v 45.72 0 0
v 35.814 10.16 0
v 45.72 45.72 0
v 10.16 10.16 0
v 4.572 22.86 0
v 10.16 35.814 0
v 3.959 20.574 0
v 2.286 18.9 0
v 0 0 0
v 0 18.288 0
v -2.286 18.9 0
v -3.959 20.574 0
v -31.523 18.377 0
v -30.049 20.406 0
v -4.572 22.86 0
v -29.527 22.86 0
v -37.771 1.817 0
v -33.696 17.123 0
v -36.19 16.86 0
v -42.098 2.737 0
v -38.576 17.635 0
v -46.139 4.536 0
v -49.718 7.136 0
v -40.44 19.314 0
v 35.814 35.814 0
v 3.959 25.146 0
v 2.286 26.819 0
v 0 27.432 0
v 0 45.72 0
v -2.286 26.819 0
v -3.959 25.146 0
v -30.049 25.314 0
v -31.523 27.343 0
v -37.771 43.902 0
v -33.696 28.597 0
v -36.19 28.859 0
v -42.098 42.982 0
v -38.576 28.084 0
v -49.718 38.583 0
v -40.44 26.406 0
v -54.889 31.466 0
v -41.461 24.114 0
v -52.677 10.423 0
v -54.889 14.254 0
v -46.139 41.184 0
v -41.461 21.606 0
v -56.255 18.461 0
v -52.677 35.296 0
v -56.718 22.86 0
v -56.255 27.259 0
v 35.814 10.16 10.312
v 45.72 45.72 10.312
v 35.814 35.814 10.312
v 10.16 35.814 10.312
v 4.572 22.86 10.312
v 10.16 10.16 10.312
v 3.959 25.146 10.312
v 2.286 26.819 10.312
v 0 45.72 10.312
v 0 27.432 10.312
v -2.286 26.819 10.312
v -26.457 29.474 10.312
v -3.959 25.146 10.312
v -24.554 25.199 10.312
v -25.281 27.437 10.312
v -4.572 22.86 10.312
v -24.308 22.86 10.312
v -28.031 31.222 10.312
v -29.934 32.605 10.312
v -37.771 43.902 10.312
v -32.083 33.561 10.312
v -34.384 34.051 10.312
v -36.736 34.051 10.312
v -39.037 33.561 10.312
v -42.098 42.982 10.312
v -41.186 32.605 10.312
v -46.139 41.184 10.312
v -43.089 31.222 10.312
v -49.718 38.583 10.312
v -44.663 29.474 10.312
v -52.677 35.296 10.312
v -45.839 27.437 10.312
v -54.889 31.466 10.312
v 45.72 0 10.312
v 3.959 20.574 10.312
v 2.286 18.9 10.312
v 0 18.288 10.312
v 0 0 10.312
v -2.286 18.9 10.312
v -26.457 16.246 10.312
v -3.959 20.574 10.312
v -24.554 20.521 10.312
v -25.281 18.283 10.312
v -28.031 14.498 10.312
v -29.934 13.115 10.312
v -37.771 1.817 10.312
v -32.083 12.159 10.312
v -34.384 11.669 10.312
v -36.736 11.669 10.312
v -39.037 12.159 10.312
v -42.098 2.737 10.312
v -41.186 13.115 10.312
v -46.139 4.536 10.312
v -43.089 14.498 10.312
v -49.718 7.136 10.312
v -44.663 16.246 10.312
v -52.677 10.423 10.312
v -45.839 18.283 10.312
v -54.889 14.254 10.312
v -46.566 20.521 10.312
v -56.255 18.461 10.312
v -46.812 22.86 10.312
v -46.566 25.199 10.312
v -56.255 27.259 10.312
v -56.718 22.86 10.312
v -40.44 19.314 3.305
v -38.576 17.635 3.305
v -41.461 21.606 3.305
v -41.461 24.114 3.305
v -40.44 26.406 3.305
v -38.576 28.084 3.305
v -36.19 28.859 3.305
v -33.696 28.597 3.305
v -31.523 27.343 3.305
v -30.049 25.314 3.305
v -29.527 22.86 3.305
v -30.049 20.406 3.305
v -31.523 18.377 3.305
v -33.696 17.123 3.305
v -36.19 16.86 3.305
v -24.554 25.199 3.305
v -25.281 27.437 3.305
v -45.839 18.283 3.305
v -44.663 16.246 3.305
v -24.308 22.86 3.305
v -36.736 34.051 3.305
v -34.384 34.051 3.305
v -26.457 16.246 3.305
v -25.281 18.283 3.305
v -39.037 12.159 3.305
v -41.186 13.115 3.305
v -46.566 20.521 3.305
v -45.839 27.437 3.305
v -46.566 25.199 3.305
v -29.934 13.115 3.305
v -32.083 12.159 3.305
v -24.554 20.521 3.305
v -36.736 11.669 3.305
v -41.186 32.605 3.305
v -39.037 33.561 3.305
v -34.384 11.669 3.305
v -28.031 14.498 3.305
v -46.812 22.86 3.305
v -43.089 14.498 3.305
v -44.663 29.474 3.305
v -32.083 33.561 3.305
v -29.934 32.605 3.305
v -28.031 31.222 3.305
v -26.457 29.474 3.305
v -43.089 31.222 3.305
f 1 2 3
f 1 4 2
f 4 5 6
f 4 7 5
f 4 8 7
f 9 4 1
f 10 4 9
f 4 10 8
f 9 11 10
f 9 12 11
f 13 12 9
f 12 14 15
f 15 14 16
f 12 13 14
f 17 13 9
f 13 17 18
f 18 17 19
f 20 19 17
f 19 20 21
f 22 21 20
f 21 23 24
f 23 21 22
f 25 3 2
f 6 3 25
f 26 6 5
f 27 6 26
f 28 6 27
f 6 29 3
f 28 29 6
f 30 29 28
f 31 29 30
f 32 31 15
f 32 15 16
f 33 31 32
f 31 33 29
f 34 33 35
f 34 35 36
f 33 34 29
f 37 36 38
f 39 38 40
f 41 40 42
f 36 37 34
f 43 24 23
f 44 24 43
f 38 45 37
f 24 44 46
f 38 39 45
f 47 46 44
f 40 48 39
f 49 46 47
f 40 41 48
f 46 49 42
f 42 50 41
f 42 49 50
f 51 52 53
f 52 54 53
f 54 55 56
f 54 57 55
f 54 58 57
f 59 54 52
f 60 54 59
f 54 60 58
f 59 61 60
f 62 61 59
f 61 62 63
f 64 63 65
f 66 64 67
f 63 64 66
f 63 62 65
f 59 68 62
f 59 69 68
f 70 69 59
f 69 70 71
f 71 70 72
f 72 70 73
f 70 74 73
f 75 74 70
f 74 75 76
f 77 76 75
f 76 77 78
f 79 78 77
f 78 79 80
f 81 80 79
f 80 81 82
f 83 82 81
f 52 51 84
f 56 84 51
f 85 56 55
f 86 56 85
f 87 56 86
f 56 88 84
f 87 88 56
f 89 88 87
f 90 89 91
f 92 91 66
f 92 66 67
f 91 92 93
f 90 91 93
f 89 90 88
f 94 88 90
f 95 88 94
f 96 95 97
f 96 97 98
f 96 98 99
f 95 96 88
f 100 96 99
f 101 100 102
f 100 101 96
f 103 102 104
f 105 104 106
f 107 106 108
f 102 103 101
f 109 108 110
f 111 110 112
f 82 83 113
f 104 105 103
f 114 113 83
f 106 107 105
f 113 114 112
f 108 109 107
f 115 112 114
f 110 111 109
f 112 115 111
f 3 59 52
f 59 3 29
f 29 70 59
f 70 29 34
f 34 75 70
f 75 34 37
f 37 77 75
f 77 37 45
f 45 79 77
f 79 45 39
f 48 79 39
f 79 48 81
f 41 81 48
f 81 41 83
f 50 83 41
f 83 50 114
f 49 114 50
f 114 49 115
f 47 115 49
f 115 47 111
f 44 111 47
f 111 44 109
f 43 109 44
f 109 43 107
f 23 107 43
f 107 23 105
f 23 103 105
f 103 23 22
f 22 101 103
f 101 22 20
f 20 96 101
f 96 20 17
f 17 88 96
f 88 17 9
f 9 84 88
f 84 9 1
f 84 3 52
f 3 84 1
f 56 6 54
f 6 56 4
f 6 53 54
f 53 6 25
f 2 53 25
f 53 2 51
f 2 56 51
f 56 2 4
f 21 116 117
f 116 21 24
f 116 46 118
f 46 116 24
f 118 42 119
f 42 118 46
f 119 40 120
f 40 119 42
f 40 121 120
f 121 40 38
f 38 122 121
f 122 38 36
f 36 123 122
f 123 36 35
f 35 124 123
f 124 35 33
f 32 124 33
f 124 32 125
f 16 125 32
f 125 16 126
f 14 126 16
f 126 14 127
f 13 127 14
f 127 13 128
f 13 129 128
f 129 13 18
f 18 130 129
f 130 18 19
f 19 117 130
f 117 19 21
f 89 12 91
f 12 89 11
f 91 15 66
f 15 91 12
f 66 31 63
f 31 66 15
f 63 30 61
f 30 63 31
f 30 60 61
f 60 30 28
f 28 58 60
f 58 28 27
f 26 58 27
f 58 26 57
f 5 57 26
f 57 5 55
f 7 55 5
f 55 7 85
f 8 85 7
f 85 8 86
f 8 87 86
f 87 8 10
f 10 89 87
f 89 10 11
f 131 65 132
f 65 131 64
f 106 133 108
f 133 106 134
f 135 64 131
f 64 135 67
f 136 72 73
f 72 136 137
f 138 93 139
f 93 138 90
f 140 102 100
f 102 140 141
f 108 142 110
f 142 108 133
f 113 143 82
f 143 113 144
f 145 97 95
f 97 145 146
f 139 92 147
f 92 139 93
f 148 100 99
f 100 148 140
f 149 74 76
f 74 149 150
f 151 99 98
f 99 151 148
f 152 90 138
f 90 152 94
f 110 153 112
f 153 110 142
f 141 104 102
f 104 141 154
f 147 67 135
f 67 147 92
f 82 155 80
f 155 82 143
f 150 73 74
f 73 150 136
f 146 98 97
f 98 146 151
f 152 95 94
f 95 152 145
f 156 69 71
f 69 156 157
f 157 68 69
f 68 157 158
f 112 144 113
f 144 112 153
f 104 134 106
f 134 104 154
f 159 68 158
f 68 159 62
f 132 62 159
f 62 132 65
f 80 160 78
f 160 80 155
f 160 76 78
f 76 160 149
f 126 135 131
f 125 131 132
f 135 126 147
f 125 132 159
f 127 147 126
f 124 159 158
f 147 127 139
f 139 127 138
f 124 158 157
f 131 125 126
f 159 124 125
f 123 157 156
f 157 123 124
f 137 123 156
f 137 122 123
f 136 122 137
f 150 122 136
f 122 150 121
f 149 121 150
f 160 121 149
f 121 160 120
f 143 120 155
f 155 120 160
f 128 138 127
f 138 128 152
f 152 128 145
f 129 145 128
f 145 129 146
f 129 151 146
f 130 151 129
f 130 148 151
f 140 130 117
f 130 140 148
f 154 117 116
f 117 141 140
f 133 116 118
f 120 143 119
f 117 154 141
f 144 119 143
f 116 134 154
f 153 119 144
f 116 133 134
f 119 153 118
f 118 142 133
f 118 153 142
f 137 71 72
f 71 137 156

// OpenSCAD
// file: ../Vitamins/Bearing.scad
//
// Square Tube dimensions
//
BearingInnerRadius     = 1;
BearingOuterRadius     = 2;
BearingHeight          = 3;
BearingRaceRadius      = 4;
BearingFn              = 5;
BearingClearanceLoose  = 6; // Added to width, should slide freely
BearingClearanceSnug   = 7; // Added to width, should not slip (default)

function BearingClearanceSnug()  = BearingClearanceSnug;
function BearingClearanceLoose() = BearingClearanceLoose;

function BearingClearance(spec, clearance)   = (clearance != undef) ? lookup(clearance, spec) : 0;
function BearingInnerRadius(spec, clearance) = lookup(BearingInnerRadius, spec) + BearingClearance(spec, clearance);
function BearingOuterRadius(spec, clearance) = lookup(BearingOuterRadius, spec) + BearingClearance(spec, clearance);
function BearingHeight(spec)                 = lookup(BearingHeight, spec);
function BearingRaceRadius(spec)             = lookup(BearingRaceRadius, spec);
function BearingFn(spec)                     = lookup(BearingFn, spec);


// 608 Bearing
Bearing608 = [
  [BearingInnerRadius,    0.157],
  [BearingOuterRadius,    0.433],
  [BearingHeight,         0.276],
  [BearingRaceRadius,     0.2375],
  [BearingFn,             30],
  [BearingClearanceLoose, 0.02], // TODO: Verify
  [BearingClearanceSnug,  0.01], // TODO: Verify
];
function Spec_Bearing608() = Bearing608;

module Bearing2D(spec=Spec_Bearing608(), clearance=BearingClearanceSnug(), solid=false) {
  //echo(BearingInnerRadius(spec, clearance));
  difference() {
    circle(r=BearingOuterRadius(spec, clearance), $fn=BearingFn(spec));

    if (solid==false)
    circle(r=BearingInnerRadius(spec, clearance), $fn=BearingFn(spec)/2);
  }
}

module Bearing(spec=Spec_Bearing608(), clearance=BearingClearanceSnug(), solid=false) {
  linear_extrude(height=BearingHeight(spec))
  Bearing2D(spec=spec, clearance=clearance, solid=solid);
}

scale([25.4, 25.4, 25.4])
Bearing(spec=Spec_Bearing608());
// file: ../Vitamins/Square Tube.scad
//
// Square Tube dimensions
//
SquareTubeInner           = 1;
SquareTubeOuter           = 2;
SquareTubeCornerRadius    = 3;
SquareTubeClearanceLoose  = 4; // Added to width, should slide freely
SquareTubeClearanceSnug   = 5; // Added to width, should not slip (default)
SquareTubeWeightPerUnit   = 6;

function SquareTubeClearanceSnug()  = SquareTubeClearanceSnug;
function SquareTubeClearanceLoose() = SquareTubeClearanceLoose;

function SquareTubeClearance(spec, clearance) = (clearance != undef) ? lookup(clearance, spec) : 0;
function SquareTubeInner(spec, clearance)     = lookup(SquareTubeInner, spec) + SquareTubeClearance(spec, clearance);
function SquareTubeOuter(spec, clearance)     = lookup(SquareTubeOuter, spec) + SquareTubeClearance(spec, clearance);
function SquareTubeCornerRadius(spec)         = lookup(SquareTubeCornerRadius, spec);
function SquareTubeWall(spec)                 = (SquareTubeOuter(spec) - SquareTubeInner(spec))/2;


// 1" Square Tube
SquareTubeOneInch = [
  [SquareTubeInner,          0.87],
  [SquareTubeOuter,          1],
  [SquareTubeCornerRadius,   0.11],
  [SquareTubeClearanceLoose, 0.015], // TODO: Verify
  [SquareTubeClearanceSnug,  0.01], // TODO: Verify
  [SquareTubeWeightPerUnit,  0] // TODO
];
function Spec_SquareTubeOneInch() = SquareTubeOneInch;

module Tubing2D(spec=Spec_SquareTubeOneInch(), clearance=SquareTubeClearanceSnug(), solid=false) {
  union() {
    difference() {
      square([SquareTubeOuter(spec, clearance), SquareTubeOuter(spec, clearance)]);

      if (solid==false)
      translate([SquareTubeWall(spec),SquareTubeWall(spec),0])
      square([SquareTubeInner(spec), SquareTubeInner(spec)]);
    }

    // Corner chamfers
    for (i=[[SquareTubeWall(spec),SquareTubeWall(spec),0],
            [SquareTubeInner(spec)+SquareTubeWall(spec),SquareTubeWall(spec),90],
            [SquareTubeInner(spec)+SquareTubeWall(spec),SquareTubeInner(spec)+SquareTubeWall(spec),180],
            [SquareTubeWall(spec),SquareTubeInner(spec)+SquareTubeWall(spec),-90]]) {
      translate([i[0],i[1]])
      rotate([0,0,i[2]])
      polygon([[0,0], [SquareTubeCornerRadius(spec),0], [0, SquareTubeCornerRadius(spec)]]);
    }
  }
}

Tubing2D(spec=Spec_SquareTubeOneInch());

module TubingInsert2D(spec=Spec_SquareTubeOneInch()) {
  difference() {
    square([tubingInner,tubingInner]);

    // Corner chamfers
    for (i=[[0,0,0],
             [tubingInner,0,90],
             [tubingInner,tubingInner,180],
             [0,tubingInner,-90]]) {
      translate([i[0],i[1]])
      rotate([0,0,i[2]])
      polygon([[0,0], [SquareTubeCornerRadius(spec),0], [0, SquareTubeCornerRadius(spec)]]);
    }
  }
}

//TubingInsert2D();
// main file
use <../Vitamins/Square Tube.scad>;
use <../Vitamins/Bearing.scad>;

module TubularBearings2D(tube=Spec_SquareTubeOneInch(), tubeClearance=SquareTubeClearanceSnug(),
                         bearing=Spec_Bearing608(), bearingOffset=1.4,
                         pivot=0.18,
                         backHeight=0.13, wall=0.4) {

  bearingOffsetY = wall+(SquareTubeOuter(tube)/2);
  difference() {
    hull() {
      square([SquareTubeOuter(tube)+(wall*2), SquareTubeOuter(tube)+(wall*2)]);
      
      *translate([(SquareTubeOuter(tube)/2)+(wall*1.5),(SquareTubeOuter(tube)/2) + wall,0])
      circle(r=(SquareTubeOuter(tube)/2)+(wall*1.5), $fn=20);
      
      translate([-bearingOffset,bearingOffsetY])
      circle(r=BearingOuterRadius(bearing, clearance=undef)+wall, $fn=BearingFn(bearing));
    }
    
    // Bolt holes
    for (i = [bearingOffsetY])
    translate([0,i])
    circle(r=0.18, $fn=12);
    
    // Bearing race hole
    translate([-bearingOffset,bearingOffsetY])
    circle(r=BearingRaceRadius(bearing),
           $fn=BearingFn(bearing)/2);
  
    // Tubing hole
    translate([wall,wall])
    Tubing2D(solid=true, clearance=tubeClearance, spec=tube);
  }
}

module TubularBearingsBack(tube=Spec_SquareTubeOneInch(), bearing=Spec_Bearing608(),
                       backHeight=0.13, bearingOffset=1.4, wall=0.4) {

  bearingOffsetY = wall+(SquareTubeOuter(tube)/2);      
  difference() {
    linear_extrude(height=BearingHeight(bearing)+backHeight)
    TubularBearings2D();
    
    translate([-bearingOffset,bearingOffsetY,backHeight+0.0001])
    Bearing(spec=Spec_Bearing608(), clearance=BearingClearanceSnug(), solid=true);
  }
}

module TubularBearingsFront(tube=Spec_SquareTubeOneInch(), bearing=Spec_Bearing608(),
                            bearingOffset=1.4, wall=0.4) {

  linear_extrude(height=0.5)
  TubularBearings2D();
}

scale([25.4, 25.4, 25.4]) {
  TubularBearingsBack();
  
  translate([0,0,0.5])
  *TubularBearingsFront();
}
